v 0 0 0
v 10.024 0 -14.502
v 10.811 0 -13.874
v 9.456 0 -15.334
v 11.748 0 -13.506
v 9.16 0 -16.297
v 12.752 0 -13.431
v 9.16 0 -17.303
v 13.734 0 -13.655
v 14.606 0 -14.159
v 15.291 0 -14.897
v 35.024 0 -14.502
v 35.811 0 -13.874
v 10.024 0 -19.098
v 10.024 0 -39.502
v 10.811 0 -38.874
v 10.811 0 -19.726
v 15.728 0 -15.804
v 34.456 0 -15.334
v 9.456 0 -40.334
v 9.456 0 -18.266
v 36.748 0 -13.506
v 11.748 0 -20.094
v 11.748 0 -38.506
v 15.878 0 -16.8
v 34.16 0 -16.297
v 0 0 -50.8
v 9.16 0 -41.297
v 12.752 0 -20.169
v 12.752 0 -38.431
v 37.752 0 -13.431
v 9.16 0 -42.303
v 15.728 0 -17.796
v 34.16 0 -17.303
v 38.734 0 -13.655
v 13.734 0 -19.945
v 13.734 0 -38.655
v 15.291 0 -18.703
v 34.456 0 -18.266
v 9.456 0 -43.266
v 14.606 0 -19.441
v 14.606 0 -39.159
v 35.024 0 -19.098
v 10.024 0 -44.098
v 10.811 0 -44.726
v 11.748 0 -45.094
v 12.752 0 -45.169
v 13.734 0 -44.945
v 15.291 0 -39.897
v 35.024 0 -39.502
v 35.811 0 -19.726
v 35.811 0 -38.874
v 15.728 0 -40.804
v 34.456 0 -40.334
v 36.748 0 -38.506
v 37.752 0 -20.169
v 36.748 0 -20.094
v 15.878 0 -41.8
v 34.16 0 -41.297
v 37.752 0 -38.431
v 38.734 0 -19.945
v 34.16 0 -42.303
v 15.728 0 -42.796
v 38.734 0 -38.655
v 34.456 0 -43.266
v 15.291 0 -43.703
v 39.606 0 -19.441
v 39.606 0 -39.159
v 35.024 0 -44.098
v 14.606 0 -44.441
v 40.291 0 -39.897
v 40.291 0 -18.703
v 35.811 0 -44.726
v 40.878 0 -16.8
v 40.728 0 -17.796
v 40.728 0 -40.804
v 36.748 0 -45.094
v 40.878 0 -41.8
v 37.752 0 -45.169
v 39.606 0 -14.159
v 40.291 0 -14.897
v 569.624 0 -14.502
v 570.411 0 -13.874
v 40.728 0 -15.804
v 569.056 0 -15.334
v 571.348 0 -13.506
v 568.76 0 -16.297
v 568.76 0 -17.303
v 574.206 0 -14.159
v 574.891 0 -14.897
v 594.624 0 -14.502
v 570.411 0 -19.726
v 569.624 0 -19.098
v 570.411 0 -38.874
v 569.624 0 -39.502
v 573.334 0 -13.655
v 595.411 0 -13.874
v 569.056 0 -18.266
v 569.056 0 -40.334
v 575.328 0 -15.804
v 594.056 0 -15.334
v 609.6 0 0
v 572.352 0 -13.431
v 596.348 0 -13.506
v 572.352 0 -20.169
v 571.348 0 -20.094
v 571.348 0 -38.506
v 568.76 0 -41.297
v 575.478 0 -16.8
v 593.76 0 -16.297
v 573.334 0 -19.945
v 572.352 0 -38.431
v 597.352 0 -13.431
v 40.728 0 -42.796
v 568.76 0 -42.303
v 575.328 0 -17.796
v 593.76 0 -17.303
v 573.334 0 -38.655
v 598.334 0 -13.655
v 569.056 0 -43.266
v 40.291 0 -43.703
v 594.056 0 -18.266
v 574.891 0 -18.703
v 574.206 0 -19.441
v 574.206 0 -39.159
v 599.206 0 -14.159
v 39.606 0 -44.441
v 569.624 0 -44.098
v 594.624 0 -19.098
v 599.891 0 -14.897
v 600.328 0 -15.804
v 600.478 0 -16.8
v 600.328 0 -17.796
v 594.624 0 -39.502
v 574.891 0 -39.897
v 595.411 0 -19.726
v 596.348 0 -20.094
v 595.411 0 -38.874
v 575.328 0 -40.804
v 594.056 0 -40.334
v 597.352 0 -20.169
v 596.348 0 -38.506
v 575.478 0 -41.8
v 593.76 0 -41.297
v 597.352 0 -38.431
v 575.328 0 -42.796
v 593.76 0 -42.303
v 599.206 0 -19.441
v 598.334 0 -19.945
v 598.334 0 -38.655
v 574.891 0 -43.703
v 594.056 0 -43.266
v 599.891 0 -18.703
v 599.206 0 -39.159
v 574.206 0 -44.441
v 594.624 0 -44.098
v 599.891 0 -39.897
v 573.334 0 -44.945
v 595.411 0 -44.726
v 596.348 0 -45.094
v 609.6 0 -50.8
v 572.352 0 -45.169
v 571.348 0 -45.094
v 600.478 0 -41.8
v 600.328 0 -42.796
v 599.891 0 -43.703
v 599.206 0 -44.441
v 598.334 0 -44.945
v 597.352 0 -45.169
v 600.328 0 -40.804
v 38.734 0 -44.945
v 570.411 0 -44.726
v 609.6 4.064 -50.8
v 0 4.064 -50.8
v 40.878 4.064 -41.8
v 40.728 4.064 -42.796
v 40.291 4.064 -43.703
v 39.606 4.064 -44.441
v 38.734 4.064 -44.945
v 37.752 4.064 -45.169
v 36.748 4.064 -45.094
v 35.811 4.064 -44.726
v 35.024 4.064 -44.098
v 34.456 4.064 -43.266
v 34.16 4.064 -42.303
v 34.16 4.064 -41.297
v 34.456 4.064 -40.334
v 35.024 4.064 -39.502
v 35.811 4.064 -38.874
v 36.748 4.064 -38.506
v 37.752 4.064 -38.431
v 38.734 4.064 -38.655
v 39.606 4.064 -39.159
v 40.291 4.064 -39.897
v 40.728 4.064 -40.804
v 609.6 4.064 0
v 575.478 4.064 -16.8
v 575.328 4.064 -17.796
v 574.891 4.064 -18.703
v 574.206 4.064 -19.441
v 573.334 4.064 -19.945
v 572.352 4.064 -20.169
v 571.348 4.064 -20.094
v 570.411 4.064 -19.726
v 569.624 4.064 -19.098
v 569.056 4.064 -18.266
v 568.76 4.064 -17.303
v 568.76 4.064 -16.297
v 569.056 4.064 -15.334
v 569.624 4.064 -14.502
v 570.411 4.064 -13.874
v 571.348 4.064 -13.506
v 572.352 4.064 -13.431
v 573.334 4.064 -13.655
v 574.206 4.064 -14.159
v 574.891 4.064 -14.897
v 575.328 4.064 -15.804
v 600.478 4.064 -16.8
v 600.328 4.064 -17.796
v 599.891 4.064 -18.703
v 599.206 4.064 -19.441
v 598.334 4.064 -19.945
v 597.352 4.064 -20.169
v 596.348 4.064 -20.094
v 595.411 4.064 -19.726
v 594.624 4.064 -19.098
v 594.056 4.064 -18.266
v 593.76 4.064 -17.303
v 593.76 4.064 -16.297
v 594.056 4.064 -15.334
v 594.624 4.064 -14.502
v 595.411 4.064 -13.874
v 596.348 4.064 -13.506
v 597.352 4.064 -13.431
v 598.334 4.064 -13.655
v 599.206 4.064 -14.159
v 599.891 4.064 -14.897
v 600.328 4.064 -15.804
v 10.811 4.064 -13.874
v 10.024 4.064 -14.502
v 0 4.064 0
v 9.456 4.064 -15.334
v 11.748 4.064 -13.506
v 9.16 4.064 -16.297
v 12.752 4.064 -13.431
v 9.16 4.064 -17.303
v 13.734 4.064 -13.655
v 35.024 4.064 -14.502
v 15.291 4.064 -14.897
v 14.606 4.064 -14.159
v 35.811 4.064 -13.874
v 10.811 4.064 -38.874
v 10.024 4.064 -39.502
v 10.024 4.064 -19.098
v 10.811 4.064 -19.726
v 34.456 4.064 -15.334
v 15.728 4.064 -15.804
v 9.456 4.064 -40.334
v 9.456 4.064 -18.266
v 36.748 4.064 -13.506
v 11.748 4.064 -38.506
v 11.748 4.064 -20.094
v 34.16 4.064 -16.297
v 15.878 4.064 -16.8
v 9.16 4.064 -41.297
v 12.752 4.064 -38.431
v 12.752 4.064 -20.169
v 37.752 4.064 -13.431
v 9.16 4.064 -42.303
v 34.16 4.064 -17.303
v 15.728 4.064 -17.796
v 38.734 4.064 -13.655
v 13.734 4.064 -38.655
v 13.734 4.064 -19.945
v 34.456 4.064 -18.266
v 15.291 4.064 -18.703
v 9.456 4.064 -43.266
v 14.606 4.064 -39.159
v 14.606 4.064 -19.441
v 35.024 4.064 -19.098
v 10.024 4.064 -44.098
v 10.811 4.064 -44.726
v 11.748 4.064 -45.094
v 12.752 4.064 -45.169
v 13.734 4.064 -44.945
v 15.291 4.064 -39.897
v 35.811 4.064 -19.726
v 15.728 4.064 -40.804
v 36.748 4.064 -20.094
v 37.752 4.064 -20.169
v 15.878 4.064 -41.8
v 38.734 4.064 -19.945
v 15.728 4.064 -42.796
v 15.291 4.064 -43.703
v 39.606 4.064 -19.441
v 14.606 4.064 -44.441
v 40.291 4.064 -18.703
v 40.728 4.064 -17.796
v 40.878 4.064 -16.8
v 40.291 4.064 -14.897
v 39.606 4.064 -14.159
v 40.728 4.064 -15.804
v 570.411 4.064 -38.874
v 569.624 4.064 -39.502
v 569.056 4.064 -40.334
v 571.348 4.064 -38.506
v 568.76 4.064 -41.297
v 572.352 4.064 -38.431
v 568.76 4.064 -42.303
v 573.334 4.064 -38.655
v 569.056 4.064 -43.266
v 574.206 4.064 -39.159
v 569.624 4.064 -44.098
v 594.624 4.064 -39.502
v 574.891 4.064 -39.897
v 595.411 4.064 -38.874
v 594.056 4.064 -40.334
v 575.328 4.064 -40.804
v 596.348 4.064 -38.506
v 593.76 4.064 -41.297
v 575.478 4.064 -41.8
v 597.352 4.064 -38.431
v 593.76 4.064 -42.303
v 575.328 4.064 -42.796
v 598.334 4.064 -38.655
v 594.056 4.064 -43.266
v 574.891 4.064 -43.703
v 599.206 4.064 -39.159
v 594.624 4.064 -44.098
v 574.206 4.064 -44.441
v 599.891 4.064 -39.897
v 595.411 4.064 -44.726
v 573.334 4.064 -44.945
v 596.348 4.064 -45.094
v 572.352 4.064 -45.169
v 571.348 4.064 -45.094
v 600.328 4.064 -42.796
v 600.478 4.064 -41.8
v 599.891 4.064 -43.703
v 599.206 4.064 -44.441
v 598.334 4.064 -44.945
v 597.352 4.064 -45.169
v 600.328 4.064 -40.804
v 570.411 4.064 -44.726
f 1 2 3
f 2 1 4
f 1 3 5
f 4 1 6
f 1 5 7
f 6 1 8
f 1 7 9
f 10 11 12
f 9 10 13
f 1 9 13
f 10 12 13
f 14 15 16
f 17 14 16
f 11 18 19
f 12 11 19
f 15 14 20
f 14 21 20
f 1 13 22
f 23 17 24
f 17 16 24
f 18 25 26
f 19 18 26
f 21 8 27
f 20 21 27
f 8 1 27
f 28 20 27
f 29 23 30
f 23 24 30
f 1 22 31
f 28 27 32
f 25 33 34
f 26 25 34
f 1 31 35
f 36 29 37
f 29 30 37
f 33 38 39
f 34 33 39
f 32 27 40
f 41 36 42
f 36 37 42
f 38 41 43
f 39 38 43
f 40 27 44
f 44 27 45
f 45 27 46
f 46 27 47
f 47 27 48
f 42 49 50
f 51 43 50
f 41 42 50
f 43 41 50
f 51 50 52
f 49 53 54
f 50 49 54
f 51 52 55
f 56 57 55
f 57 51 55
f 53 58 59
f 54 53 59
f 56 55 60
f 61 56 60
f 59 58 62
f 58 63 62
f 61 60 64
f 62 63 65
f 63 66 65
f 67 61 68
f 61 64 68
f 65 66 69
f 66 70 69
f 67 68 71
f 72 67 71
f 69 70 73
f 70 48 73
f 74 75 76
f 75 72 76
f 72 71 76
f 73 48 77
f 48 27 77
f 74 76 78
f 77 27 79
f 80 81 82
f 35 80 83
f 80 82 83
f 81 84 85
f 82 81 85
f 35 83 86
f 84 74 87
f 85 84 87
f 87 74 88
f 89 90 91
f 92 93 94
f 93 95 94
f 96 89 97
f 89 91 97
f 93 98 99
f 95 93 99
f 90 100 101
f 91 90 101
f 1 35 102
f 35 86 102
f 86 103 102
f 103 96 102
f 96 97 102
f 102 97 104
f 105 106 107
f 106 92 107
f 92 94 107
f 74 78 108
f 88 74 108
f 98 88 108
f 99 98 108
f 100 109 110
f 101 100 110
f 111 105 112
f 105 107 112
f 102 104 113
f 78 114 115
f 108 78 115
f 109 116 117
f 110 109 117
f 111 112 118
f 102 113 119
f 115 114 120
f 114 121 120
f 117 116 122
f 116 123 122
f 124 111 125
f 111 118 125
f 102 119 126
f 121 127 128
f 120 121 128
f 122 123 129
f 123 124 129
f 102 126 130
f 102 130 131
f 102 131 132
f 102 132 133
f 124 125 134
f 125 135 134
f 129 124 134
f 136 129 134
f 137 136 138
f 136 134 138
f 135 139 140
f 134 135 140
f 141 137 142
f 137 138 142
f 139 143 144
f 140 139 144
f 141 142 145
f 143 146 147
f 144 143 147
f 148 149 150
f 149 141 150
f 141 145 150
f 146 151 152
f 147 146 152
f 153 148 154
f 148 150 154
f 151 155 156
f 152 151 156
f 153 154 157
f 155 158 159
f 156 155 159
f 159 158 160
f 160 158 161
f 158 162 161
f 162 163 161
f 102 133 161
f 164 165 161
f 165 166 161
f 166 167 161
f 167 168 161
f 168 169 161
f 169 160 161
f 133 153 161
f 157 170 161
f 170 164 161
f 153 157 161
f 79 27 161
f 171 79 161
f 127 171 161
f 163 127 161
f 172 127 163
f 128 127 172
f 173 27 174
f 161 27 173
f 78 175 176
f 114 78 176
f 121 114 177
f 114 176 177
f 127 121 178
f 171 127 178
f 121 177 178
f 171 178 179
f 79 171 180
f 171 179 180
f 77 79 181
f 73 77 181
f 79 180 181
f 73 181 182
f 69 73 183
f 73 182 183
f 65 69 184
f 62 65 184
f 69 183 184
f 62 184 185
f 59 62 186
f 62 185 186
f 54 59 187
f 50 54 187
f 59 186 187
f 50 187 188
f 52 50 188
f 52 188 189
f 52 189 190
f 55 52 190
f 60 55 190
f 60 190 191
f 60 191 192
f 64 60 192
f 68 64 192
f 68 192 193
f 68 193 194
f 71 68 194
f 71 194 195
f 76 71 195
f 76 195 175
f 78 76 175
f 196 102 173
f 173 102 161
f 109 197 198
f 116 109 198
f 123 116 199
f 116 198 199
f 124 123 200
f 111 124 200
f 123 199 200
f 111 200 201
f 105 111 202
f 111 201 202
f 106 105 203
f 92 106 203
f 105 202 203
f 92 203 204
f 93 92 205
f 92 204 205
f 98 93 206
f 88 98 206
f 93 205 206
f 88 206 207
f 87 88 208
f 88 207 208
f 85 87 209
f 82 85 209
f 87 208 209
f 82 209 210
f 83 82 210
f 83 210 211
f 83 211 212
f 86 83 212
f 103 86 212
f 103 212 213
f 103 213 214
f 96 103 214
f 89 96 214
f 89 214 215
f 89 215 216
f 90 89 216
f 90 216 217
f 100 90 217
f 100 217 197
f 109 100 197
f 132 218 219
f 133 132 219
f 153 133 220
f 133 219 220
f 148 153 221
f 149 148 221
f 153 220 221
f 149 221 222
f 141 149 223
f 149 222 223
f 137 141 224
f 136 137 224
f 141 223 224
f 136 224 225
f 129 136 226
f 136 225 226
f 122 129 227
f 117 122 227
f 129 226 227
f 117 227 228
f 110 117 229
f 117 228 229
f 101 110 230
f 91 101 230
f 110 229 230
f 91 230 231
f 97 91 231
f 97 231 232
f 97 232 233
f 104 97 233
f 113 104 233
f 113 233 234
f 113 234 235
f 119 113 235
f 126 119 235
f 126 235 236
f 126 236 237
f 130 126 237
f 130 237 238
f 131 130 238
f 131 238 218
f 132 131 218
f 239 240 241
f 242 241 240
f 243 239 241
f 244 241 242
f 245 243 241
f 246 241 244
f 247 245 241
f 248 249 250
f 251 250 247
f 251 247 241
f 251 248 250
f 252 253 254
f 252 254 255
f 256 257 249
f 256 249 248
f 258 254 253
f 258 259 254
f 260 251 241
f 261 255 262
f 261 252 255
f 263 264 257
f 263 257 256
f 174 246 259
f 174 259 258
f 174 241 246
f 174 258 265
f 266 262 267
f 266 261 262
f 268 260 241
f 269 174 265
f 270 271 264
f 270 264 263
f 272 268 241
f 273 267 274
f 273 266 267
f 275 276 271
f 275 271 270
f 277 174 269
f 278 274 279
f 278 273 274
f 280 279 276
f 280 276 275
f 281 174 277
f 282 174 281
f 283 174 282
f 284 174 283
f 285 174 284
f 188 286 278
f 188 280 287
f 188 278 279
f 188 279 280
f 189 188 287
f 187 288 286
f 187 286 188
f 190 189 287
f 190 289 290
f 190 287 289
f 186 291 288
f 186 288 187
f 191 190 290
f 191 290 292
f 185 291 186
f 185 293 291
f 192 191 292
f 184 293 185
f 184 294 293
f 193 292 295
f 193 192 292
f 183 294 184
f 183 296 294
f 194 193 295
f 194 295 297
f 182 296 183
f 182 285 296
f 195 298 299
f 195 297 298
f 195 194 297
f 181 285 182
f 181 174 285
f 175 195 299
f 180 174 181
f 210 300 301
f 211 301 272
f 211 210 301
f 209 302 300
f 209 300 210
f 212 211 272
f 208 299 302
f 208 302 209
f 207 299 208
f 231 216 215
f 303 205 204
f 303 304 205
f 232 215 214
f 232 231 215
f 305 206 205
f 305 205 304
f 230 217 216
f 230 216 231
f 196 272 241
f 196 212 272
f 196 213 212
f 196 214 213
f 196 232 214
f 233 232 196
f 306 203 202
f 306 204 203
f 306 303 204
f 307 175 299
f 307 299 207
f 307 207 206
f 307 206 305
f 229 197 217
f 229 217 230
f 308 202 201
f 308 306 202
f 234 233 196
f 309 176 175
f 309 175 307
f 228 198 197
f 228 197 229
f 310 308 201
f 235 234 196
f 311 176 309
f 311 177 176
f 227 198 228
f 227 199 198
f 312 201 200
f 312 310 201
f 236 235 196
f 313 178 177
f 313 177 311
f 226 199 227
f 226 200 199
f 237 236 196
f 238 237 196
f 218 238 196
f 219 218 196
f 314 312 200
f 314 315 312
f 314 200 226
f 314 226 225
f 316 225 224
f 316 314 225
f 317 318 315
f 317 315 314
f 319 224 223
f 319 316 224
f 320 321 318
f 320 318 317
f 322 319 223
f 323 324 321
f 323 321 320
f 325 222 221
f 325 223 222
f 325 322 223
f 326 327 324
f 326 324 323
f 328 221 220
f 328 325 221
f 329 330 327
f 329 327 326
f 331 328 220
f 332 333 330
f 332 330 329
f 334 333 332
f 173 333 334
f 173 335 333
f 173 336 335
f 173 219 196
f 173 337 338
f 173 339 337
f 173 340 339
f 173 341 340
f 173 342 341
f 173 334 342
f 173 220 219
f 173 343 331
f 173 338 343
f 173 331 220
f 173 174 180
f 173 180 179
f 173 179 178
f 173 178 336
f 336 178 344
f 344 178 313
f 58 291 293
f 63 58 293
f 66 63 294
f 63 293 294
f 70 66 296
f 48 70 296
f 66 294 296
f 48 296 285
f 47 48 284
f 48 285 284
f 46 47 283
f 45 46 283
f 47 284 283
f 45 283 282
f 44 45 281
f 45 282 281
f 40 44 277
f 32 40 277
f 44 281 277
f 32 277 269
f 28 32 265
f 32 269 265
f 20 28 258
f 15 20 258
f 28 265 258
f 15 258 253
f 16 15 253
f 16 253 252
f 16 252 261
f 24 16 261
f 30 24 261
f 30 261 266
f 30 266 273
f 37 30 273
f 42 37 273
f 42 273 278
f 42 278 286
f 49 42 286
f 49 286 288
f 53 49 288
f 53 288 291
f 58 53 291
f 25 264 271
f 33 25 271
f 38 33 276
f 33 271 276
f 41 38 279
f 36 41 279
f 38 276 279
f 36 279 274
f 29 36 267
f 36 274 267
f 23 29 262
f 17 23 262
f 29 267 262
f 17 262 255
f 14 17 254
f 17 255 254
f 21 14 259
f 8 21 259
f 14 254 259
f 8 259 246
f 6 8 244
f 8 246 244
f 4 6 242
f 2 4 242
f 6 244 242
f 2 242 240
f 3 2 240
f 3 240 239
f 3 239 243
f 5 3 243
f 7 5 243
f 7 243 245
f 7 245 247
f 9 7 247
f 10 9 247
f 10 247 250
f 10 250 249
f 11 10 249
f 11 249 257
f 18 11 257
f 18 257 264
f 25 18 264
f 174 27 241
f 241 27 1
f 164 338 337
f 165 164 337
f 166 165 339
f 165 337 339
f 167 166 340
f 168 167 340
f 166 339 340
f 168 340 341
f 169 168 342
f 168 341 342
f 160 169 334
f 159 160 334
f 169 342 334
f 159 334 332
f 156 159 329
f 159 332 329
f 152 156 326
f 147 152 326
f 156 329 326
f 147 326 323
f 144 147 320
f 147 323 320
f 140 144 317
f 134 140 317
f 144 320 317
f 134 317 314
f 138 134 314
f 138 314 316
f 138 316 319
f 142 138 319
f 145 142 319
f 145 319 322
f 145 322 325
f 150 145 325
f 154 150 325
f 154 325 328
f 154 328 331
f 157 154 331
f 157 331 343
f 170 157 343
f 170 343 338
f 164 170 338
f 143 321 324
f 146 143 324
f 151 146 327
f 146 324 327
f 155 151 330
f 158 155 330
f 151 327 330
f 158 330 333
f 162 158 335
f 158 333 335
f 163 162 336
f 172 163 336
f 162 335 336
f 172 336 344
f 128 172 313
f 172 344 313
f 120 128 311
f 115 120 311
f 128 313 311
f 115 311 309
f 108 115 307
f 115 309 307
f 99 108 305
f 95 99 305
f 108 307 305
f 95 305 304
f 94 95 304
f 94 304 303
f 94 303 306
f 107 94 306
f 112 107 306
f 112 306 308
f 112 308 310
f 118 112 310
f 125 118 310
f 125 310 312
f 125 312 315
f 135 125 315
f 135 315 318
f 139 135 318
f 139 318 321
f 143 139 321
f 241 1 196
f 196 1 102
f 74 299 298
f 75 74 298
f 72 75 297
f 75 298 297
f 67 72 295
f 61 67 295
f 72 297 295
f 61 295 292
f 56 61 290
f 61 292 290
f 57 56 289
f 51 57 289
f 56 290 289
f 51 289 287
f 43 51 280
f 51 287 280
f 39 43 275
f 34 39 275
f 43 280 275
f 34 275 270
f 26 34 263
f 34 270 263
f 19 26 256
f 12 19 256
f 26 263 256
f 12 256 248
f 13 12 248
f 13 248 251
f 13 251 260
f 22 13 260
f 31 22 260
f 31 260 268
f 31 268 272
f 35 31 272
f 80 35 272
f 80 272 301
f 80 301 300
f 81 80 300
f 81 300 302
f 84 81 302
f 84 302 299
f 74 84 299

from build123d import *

# Parameters (mm, degrees)
SKETCH1_W               = 609.6
SKETCH1_H               = 43.8
SKETCH1_H_2             = 7
BOSS_EXTRUDE1_DEPTH     = 4.064
F_1_4_CLEARANCE_HOLE1_D = 6.7564


with BuildPart() as part:
    # Sketch1 → Boss-Extrude1 (new body)
    with BuildSketch(Plane(origin=(0, 0, 0), x_dir=(1, 0, 0), z_dir=(0, 1, 0))):
        with Locations((304.8, 28.9)):
            Rectangle(SKETCH1_W, SKETCH1_H)
        with Locations((304.8, 3.5)):
            Rectangle(SKETCH1_W, SKETCH1_H_2)
    extrude(amount=BOSS_EXTRUDE1_DEPTH)

    # 1/4 Clearance Hole1 (through all)
    with Locations(Plane(origin=(0, 0, 0), x_dir=(-1, 0, 0), z_dir=(0, -1, 0))):
        with Locations((-12.5, 41.8), (-37.5, 41.8), (-37.5, 16.8), (-12.5, 16.8), (-572.1, 41.8), (-597.1, 41.8), (-597.1, 16.8), (-572.1, 16.8)):
            Hole(F_1_4_CLEARANCE_HOLE1_D / 2)


solid = part.part
